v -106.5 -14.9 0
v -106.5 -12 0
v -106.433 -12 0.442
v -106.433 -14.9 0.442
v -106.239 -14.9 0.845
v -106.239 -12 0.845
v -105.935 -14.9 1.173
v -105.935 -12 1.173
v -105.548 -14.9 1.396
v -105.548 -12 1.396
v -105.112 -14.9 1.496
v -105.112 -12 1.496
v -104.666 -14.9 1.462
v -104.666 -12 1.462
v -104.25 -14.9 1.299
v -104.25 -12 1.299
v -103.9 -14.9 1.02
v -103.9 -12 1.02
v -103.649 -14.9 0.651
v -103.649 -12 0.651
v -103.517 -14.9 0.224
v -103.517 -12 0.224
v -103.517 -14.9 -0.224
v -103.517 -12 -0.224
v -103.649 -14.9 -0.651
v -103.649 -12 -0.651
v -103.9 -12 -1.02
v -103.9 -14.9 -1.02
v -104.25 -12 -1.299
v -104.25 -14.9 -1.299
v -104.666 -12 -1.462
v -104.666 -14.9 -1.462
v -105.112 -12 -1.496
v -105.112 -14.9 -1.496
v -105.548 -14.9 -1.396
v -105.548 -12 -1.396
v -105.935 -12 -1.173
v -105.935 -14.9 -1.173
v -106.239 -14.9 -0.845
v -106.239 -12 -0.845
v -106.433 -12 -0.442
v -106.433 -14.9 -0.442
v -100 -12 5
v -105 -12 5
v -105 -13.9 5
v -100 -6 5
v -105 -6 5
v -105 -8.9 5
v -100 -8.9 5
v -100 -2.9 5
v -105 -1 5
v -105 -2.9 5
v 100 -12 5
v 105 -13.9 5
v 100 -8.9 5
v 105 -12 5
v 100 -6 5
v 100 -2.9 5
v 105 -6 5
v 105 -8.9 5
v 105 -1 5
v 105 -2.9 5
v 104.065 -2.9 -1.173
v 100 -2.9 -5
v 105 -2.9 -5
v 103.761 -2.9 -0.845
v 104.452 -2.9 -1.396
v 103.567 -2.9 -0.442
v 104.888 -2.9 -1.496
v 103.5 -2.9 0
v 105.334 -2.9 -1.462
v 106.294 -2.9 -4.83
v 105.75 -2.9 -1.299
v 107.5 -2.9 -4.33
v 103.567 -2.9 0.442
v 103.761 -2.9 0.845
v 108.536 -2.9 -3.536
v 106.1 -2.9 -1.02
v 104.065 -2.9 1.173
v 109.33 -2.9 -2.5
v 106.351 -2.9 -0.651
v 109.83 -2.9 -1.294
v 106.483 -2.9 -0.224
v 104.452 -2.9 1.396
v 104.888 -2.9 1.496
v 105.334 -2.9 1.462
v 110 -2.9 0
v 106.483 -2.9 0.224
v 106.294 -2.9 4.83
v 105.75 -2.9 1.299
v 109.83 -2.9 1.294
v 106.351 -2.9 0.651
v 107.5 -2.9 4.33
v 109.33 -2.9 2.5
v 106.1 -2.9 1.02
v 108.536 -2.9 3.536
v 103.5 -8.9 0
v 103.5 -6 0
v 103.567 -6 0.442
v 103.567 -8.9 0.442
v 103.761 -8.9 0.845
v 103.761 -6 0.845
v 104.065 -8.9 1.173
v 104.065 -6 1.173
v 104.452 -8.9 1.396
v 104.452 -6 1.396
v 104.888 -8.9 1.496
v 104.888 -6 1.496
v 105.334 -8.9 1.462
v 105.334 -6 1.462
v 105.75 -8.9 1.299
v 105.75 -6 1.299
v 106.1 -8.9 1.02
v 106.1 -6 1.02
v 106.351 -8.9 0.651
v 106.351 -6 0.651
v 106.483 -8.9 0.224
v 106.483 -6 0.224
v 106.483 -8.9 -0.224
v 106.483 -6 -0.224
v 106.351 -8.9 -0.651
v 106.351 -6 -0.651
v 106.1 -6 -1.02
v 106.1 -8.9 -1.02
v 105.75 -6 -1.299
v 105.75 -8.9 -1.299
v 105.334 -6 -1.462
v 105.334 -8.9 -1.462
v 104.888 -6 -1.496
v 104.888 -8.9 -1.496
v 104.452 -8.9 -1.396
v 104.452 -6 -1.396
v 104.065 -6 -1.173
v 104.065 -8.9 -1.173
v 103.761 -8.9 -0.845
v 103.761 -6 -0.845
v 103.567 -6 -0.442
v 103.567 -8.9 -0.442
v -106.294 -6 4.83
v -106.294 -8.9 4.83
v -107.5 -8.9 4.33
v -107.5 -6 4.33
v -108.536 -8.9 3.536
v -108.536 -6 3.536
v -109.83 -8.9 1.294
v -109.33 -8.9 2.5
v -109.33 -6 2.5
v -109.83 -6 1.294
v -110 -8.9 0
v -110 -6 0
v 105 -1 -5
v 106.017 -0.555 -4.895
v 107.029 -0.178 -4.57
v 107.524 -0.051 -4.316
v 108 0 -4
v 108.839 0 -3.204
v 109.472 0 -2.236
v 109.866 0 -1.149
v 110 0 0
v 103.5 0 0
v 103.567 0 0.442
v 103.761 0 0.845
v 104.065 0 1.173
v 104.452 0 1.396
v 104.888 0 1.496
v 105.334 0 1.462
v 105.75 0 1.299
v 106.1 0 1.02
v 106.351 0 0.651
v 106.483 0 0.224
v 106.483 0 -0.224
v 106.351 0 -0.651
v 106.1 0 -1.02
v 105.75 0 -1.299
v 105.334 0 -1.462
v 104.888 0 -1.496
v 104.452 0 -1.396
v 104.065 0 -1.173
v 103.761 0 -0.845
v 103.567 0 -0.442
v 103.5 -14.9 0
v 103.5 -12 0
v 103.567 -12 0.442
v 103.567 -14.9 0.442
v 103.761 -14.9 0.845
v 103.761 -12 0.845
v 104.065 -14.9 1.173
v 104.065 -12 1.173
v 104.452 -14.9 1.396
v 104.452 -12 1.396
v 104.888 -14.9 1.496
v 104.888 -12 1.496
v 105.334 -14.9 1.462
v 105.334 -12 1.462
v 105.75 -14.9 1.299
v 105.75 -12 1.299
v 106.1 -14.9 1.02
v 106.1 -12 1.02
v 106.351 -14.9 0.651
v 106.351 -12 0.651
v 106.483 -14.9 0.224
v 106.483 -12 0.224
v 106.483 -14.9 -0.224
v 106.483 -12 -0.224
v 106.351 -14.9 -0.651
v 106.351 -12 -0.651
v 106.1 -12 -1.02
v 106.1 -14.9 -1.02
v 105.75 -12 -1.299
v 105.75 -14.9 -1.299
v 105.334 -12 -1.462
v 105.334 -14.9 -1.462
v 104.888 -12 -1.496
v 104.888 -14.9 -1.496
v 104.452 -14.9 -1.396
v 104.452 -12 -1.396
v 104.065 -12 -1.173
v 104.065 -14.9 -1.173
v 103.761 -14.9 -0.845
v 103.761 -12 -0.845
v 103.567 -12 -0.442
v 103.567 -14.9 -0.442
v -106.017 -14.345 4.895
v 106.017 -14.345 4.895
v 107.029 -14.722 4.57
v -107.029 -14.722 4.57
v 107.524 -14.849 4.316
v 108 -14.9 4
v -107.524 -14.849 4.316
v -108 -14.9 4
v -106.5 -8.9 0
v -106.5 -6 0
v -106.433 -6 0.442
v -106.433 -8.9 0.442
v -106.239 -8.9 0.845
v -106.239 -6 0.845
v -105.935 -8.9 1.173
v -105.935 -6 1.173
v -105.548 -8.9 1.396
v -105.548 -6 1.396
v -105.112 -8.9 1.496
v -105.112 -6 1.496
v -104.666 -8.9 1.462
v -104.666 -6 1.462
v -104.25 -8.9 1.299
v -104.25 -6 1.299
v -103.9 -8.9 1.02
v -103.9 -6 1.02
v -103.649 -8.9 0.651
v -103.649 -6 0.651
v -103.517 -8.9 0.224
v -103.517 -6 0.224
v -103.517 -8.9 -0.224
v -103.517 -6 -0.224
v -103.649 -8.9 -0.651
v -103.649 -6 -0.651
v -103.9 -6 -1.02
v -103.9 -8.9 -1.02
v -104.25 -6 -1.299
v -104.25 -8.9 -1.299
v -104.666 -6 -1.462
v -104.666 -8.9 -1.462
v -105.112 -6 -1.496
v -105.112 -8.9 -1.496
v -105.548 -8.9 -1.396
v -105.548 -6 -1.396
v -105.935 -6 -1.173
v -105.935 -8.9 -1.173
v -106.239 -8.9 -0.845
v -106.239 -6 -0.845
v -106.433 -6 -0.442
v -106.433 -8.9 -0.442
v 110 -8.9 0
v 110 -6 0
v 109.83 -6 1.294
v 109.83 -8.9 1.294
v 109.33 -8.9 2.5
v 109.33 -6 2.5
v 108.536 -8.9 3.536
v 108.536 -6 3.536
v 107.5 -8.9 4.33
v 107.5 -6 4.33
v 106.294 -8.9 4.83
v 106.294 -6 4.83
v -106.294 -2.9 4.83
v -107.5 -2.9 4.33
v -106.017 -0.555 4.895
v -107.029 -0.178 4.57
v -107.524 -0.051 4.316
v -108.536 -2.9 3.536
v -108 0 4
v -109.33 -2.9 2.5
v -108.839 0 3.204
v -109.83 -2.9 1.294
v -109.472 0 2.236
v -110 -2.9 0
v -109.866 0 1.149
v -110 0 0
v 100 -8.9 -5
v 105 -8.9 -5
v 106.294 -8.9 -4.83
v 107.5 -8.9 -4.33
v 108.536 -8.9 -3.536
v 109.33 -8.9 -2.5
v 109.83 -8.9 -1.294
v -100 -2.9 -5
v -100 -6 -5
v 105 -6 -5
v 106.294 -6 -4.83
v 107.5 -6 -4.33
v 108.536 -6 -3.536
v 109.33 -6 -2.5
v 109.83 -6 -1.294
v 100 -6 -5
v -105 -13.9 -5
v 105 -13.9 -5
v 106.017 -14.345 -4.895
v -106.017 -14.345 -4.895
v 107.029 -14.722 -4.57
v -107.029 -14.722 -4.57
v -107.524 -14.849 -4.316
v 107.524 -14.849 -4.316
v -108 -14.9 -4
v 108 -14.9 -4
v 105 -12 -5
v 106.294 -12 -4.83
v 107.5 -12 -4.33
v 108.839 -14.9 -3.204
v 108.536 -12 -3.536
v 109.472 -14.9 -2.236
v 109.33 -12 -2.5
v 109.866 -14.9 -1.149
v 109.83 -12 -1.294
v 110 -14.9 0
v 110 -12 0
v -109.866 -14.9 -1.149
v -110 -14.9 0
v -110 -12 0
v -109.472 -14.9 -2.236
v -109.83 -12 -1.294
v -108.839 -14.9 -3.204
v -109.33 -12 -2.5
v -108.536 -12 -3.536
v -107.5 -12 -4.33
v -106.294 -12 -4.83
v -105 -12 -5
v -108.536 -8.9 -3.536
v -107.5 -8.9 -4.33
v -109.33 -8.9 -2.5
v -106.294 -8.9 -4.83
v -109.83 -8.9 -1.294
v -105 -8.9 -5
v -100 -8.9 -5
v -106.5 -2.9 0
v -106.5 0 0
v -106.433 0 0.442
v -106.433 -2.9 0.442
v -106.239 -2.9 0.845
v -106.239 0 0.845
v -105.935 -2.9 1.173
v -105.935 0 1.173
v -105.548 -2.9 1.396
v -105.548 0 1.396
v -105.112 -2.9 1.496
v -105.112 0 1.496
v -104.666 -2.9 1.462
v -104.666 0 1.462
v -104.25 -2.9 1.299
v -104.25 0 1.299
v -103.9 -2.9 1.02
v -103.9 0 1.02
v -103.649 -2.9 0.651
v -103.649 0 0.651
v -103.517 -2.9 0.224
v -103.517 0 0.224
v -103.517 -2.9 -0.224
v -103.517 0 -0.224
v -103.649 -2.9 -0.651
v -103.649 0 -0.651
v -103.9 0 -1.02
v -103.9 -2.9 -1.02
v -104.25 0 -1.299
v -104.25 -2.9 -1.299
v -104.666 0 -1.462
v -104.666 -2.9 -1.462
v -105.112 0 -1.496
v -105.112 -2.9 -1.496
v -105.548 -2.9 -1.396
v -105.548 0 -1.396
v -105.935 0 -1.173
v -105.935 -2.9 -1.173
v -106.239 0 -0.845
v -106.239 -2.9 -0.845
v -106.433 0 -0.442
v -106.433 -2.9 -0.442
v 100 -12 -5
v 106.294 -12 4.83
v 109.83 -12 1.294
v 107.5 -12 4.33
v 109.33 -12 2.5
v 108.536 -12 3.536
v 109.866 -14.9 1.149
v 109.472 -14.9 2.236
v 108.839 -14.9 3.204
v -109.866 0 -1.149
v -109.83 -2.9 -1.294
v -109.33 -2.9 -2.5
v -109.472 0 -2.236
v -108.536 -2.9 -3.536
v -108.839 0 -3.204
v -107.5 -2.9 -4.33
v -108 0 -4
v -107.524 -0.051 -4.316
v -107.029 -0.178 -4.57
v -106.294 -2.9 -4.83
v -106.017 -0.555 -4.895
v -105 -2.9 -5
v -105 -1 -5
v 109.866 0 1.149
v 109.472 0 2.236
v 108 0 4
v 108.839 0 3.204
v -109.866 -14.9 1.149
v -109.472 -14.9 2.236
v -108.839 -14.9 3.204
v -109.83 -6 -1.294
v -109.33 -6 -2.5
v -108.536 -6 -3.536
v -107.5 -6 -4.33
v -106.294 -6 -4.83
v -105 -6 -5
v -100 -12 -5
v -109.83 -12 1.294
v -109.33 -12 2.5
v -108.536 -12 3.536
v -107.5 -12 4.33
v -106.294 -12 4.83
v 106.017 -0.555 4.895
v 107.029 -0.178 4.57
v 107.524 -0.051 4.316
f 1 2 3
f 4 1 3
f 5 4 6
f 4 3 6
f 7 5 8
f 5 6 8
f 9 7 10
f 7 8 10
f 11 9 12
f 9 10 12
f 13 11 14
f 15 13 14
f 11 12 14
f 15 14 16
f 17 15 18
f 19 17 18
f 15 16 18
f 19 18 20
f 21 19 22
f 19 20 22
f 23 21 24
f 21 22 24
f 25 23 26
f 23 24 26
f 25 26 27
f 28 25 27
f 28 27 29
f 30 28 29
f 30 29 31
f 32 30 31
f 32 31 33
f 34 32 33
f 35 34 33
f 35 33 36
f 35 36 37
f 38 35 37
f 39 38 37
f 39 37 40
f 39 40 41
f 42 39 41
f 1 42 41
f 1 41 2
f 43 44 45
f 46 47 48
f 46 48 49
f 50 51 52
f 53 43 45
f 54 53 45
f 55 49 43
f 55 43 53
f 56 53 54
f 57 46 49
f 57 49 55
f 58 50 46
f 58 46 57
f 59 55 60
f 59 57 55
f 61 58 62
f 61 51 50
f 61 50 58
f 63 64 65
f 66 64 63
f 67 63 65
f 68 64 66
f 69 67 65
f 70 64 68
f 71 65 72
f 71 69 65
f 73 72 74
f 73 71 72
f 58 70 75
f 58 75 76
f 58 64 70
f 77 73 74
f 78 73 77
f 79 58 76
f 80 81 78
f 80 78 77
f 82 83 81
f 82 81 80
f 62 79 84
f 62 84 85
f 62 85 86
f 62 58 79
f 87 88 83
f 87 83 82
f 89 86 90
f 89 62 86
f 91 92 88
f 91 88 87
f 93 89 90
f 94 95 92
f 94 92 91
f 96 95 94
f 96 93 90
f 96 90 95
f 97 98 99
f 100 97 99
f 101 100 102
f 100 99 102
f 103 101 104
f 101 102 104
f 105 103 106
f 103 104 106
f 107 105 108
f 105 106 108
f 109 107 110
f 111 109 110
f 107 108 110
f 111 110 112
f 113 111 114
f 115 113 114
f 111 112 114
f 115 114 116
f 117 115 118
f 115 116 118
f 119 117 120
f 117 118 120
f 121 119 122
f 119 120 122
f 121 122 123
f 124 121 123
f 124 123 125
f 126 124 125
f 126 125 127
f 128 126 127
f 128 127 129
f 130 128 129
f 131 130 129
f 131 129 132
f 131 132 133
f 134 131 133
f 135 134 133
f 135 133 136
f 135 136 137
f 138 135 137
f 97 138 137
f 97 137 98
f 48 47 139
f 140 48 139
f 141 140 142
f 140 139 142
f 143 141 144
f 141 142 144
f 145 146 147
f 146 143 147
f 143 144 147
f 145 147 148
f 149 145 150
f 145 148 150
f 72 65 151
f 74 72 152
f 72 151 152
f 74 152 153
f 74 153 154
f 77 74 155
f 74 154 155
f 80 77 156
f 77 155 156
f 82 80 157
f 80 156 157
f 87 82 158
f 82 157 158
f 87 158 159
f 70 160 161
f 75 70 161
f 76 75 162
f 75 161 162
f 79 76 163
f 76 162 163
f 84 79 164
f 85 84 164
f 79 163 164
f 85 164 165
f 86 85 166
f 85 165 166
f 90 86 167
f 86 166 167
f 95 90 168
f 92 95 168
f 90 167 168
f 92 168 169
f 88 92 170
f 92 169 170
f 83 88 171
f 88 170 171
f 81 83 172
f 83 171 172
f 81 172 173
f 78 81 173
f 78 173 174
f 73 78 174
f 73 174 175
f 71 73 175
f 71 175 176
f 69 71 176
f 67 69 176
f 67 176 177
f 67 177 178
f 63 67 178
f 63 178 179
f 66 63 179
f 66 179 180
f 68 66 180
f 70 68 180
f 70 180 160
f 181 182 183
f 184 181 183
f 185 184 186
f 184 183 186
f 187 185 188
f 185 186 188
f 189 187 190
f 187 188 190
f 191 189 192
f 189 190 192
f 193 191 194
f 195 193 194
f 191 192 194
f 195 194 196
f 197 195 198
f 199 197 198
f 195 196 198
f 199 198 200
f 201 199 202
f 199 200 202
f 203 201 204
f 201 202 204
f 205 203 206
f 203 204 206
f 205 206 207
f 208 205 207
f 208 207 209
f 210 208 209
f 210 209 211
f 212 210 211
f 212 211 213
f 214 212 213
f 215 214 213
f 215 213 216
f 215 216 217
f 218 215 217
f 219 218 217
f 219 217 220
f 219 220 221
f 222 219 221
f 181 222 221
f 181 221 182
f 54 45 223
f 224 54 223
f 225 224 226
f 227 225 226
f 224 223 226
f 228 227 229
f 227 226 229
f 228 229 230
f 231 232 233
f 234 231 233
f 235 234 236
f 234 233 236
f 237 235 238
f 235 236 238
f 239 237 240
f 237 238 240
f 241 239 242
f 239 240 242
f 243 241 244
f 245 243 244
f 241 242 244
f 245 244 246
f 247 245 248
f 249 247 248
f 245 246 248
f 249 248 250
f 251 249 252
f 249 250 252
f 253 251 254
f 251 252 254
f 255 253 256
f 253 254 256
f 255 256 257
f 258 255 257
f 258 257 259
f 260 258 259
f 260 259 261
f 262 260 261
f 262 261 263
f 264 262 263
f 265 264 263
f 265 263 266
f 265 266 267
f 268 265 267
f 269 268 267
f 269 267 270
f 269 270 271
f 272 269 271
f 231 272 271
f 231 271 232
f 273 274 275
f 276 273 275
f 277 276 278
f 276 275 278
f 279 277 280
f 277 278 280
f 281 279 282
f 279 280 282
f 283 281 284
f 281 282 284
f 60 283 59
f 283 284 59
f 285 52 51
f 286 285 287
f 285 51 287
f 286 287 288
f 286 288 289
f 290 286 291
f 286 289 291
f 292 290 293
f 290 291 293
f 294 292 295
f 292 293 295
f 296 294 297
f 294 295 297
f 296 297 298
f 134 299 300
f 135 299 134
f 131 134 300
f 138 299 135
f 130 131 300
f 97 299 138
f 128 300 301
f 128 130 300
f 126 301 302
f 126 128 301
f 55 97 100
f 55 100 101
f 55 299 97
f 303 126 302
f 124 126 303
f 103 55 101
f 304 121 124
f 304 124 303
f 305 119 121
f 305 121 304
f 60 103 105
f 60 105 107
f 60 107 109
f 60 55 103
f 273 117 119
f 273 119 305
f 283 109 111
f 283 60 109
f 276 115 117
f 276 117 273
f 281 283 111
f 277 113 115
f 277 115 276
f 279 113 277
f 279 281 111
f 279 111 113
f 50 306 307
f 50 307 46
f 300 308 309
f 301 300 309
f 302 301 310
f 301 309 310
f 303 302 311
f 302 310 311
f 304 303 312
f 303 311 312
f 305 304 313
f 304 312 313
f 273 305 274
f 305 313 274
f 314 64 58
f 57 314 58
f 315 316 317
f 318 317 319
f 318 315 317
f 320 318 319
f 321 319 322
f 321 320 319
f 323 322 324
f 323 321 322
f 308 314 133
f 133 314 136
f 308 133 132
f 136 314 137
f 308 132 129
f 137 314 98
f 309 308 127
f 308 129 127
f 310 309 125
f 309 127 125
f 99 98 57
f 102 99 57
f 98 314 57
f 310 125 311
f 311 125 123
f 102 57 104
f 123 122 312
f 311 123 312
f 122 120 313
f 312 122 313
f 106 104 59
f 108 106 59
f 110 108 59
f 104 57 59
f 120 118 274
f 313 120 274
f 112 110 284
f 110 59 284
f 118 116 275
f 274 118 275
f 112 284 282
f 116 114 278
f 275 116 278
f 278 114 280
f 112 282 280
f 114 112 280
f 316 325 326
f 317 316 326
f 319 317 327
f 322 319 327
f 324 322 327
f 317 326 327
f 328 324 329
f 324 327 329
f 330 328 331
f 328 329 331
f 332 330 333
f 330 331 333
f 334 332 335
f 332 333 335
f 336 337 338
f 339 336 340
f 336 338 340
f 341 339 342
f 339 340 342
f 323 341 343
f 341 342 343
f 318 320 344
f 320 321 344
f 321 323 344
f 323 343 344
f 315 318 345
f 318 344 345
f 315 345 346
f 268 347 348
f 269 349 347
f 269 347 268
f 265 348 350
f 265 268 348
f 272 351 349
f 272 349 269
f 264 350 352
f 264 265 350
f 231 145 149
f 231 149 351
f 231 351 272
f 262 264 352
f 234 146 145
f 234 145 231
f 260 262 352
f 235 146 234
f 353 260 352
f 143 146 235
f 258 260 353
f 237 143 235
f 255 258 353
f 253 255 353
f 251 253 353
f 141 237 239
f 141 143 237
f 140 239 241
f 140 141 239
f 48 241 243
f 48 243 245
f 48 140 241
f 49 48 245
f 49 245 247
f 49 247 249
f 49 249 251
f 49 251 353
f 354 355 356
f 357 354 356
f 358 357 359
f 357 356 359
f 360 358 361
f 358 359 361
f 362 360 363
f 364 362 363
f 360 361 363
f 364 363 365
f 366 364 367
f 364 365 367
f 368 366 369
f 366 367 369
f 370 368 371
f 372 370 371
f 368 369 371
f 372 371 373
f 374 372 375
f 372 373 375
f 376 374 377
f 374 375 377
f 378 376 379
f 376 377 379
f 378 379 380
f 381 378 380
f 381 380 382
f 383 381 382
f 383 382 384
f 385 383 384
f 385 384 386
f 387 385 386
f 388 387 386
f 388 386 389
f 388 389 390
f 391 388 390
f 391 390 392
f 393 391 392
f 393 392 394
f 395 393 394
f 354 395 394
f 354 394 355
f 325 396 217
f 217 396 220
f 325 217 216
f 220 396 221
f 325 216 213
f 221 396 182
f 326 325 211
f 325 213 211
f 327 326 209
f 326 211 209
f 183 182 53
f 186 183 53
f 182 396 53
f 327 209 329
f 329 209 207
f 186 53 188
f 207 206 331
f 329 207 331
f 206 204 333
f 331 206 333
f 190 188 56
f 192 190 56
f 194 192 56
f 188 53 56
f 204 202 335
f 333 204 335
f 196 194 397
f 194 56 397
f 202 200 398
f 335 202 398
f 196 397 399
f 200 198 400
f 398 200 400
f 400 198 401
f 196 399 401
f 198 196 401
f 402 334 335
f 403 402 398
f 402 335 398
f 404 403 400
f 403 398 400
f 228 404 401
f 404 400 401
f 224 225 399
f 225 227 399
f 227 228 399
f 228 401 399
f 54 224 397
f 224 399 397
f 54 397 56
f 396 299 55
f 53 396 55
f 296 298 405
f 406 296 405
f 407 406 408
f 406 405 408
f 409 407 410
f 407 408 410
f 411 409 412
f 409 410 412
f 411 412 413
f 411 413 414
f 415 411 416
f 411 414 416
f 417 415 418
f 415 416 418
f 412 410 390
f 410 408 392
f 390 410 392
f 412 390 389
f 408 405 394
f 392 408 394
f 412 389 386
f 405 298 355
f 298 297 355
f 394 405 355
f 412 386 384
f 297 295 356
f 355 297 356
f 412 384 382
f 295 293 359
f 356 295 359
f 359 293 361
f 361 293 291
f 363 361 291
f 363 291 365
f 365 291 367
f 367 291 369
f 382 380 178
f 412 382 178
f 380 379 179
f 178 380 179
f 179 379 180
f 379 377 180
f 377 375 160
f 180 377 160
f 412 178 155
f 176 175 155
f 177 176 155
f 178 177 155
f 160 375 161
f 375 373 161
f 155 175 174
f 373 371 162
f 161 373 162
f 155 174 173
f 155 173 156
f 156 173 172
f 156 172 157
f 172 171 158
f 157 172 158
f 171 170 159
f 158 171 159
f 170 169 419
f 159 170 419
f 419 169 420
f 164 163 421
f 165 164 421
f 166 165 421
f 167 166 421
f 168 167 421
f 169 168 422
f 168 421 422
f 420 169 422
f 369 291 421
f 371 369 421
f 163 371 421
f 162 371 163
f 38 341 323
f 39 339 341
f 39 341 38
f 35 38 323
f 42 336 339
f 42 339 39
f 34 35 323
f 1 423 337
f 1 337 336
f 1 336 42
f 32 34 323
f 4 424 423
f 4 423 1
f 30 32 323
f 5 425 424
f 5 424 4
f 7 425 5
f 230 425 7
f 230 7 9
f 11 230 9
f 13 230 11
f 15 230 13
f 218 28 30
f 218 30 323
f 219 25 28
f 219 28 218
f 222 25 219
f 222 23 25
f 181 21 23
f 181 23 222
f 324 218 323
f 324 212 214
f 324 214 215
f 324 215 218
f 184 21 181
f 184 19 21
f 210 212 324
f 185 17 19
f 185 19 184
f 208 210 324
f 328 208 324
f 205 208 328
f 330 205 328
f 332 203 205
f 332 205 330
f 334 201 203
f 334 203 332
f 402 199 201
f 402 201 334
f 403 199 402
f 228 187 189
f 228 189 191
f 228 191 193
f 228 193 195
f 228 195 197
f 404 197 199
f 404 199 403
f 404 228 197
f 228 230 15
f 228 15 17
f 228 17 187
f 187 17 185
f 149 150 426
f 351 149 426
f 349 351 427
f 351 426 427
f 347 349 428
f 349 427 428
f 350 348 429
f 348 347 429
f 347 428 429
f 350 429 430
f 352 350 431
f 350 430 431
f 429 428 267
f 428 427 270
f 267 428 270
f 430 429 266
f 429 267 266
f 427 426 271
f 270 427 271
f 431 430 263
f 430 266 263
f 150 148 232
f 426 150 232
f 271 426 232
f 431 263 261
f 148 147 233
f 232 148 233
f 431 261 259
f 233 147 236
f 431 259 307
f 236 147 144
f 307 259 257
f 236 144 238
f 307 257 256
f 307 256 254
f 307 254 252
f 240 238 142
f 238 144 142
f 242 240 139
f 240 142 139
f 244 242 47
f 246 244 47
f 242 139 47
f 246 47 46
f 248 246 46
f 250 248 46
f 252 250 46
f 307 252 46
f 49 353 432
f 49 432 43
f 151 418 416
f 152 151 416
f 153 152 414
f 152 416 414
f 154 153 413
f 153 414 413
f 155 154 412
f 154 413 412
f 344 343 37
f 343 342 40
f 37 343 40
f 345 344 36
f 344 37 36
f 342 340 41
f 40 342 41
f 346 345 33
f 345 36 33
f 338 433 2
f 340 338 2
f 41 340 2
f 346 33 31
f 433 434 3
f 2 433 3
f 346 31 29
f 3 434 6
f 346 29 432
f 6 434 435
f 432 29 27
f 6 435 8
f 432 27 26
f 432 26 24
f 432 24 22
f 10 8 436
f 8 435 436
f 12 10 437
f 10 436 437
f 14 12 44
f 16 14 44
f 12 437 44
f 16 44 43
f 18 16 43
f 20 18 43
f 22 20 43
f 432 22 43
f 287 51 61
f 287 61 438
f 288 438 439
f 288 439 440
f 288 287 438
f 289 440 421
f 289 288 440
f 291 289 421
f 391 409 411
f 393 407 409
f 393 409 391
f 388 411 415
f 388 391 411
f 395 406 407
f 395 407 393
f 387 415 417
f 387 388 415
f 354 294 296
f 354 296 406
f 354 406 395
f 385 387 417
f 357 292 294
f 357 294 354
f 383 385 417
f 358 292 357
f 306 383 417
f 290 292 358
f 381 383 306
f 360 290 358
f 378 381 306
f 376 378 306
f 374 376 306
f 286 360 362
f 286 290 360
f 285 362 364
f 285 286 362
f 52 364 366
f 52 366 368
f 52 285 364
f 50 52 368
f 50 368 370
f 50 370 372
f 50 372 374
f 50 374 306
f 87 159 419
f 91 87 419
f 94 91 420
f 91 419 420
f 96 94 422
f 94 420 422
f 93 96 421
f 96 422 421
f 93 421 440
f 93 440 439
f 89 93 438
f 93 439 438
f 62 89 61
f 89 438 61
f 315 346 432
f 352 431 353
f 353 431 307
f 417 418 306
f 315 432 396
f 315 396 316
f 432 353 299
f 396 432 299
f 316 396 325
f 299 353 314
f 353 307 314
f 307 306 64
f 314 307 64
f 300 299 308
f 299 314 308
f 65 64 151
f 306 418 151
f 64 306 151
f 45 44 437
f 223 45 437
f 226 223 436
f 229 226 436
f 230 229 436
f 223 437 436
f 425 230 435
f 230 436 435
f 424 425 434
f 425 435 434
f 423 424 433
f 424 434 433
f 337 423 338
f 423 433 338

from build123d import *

# Parameters (mm, degrees)
F0_W        = 200
F0_H        = 10
F1_DEPTH    = 14.9
F2_W        = 10
F2_H        = 2.9
F3_DEPTH    = 10
F4_R        = 1.5
F5_DEPTH    = 14.9
F6_T1_DEPTH = 218.4999999506
F6_T3_DEPTH = 218.4999999928


# Not quite as in the source:
# - a fillet or chamfer that OpenCascade refuses, or shapes differently, is made with other operations: its cross-section is extruded or revolved along the edge and cut away or added


with BuildPart() as f1:
    # F0 (on Front) → F1 (new body)
    with BuildSketch(Plane.XZ):
        Rectangle(F0_W, F0_H)
    extrude(amount=F1_DEPTH)

    # F2 (on face) → F3 (join)
    with BuildSketch(Plane.XY.offset(5)):
        with Locations((-105, -13.45)):
            Rectangle(F2_W, F2_H)
        with Locations((-105, -7.45)):
            Rectangle(F2_W, F2_H)
        with Locations((-105, -1.45)):
            Rectangle(F2_W, F2_H)
        with Locations((105, -13.45)):
            Rectangle(F2_W, F2_H)
        with Locations((105, -7.45)):
            Rectangle(F2_W, F2_H)
        with Locations((105, -1.45)):
            Rectangle(F2_W, F2_H)
    extrude(amount=-F3_DEPTH)

    # F4 (on face) → F5 (cut)
    with BuildSketch(Plane(origin=(0, 0, 0), x_dir=(-1, 0, 0), z_dir=(0, 1, 0))):
        with BuildLine():
            ThreePointArc((-110, 0), (-108.5355339059, 3.5355339059), (-105, 5))
            Line((-105, 5), (-110, 5))
            Line((-110, 5), (-110, 0))
        make_face()
        with BuildLine():
            Line((-110, -5), (-105, -5))
            ThreePointArc((-105, -5), (-108.5355339059, -3.5355339059), (-110, 0))
            Line((-110, 0), (-110, -5))
        make_face()
        with Locations((-105, 0)):
            Circle(F4_R)
        with BuildLine():
            ThreePointArc((110, 0), (108.5355338885, -3.5355339234), (104.9999999506, -5))
            Line((104.9999999506, -5), (110, -5))
            Line((110, -5), (110, 0))
        make_face()
        with BuildLine():
            Line((110, 5), (104.9999999928, 5))
            ThreePointArc((104.9999999928, 5), (108.5355339034, 3.5355339085), (110, 0))
            Line((110, 0), (110, 5))
        make_face()
        with Locations((105, 0)):
            Circle(F4_R)
    extrude(amount=-F5_DEPTH, mode=Mode.SUBTRACT)

    # F6: fillet of radius 1 on 4 edges, made by hand

    # F6_s2 → F6_t1 (cut)
    with BuildSketch(Plane.YZ.offset(-109.2499999506)):
        with BuildLine():
            ThreePointArc((-1, -5), (-0.2928932188, -4.7071067812), (0, -4))
            Line((0, -4), (0, -5))
            Line((0, -5), (-1, -5))
        make_face()
        with BuildLine():
            ThreePointArc((-13.9, -5), (-14.6071067812, -4.7071067812), (-14.9, -4))
            Line((-14.9, -4), (-14.9, -5))
            Line((-14.9, -5), (-13.9, -5))
        make_face()
    extrude(amount=F6_T1_DEPTH, mode=Mode.SUBTRACT)

    # F6_s4 → F6_t3 (cut)
    with BuildSketch(Plane.YZ.offset(-109.2499999928)):
        with BuildLine():
            ThreePointArc((-1, 5), (-0.2928932188, 4.7071067812), (0, 4))
            Line((0, 4), (0, 5))
            Line((0, 5), (-1, 5))
        make_face()
        with BuildLine():
            ThreePointArc((-13.9, 5), (-14.6071067812, 4.7071067812), (-14.9, 4))
            Line((-14.9, 4), (-14.9, 5))
            Line((-14.9, 5), (-13.9, 5))
        make_face()
    extrude(amount=F6_T3_DEPTH, mode=Mode.SUBTRACT)


solid = f1.part
